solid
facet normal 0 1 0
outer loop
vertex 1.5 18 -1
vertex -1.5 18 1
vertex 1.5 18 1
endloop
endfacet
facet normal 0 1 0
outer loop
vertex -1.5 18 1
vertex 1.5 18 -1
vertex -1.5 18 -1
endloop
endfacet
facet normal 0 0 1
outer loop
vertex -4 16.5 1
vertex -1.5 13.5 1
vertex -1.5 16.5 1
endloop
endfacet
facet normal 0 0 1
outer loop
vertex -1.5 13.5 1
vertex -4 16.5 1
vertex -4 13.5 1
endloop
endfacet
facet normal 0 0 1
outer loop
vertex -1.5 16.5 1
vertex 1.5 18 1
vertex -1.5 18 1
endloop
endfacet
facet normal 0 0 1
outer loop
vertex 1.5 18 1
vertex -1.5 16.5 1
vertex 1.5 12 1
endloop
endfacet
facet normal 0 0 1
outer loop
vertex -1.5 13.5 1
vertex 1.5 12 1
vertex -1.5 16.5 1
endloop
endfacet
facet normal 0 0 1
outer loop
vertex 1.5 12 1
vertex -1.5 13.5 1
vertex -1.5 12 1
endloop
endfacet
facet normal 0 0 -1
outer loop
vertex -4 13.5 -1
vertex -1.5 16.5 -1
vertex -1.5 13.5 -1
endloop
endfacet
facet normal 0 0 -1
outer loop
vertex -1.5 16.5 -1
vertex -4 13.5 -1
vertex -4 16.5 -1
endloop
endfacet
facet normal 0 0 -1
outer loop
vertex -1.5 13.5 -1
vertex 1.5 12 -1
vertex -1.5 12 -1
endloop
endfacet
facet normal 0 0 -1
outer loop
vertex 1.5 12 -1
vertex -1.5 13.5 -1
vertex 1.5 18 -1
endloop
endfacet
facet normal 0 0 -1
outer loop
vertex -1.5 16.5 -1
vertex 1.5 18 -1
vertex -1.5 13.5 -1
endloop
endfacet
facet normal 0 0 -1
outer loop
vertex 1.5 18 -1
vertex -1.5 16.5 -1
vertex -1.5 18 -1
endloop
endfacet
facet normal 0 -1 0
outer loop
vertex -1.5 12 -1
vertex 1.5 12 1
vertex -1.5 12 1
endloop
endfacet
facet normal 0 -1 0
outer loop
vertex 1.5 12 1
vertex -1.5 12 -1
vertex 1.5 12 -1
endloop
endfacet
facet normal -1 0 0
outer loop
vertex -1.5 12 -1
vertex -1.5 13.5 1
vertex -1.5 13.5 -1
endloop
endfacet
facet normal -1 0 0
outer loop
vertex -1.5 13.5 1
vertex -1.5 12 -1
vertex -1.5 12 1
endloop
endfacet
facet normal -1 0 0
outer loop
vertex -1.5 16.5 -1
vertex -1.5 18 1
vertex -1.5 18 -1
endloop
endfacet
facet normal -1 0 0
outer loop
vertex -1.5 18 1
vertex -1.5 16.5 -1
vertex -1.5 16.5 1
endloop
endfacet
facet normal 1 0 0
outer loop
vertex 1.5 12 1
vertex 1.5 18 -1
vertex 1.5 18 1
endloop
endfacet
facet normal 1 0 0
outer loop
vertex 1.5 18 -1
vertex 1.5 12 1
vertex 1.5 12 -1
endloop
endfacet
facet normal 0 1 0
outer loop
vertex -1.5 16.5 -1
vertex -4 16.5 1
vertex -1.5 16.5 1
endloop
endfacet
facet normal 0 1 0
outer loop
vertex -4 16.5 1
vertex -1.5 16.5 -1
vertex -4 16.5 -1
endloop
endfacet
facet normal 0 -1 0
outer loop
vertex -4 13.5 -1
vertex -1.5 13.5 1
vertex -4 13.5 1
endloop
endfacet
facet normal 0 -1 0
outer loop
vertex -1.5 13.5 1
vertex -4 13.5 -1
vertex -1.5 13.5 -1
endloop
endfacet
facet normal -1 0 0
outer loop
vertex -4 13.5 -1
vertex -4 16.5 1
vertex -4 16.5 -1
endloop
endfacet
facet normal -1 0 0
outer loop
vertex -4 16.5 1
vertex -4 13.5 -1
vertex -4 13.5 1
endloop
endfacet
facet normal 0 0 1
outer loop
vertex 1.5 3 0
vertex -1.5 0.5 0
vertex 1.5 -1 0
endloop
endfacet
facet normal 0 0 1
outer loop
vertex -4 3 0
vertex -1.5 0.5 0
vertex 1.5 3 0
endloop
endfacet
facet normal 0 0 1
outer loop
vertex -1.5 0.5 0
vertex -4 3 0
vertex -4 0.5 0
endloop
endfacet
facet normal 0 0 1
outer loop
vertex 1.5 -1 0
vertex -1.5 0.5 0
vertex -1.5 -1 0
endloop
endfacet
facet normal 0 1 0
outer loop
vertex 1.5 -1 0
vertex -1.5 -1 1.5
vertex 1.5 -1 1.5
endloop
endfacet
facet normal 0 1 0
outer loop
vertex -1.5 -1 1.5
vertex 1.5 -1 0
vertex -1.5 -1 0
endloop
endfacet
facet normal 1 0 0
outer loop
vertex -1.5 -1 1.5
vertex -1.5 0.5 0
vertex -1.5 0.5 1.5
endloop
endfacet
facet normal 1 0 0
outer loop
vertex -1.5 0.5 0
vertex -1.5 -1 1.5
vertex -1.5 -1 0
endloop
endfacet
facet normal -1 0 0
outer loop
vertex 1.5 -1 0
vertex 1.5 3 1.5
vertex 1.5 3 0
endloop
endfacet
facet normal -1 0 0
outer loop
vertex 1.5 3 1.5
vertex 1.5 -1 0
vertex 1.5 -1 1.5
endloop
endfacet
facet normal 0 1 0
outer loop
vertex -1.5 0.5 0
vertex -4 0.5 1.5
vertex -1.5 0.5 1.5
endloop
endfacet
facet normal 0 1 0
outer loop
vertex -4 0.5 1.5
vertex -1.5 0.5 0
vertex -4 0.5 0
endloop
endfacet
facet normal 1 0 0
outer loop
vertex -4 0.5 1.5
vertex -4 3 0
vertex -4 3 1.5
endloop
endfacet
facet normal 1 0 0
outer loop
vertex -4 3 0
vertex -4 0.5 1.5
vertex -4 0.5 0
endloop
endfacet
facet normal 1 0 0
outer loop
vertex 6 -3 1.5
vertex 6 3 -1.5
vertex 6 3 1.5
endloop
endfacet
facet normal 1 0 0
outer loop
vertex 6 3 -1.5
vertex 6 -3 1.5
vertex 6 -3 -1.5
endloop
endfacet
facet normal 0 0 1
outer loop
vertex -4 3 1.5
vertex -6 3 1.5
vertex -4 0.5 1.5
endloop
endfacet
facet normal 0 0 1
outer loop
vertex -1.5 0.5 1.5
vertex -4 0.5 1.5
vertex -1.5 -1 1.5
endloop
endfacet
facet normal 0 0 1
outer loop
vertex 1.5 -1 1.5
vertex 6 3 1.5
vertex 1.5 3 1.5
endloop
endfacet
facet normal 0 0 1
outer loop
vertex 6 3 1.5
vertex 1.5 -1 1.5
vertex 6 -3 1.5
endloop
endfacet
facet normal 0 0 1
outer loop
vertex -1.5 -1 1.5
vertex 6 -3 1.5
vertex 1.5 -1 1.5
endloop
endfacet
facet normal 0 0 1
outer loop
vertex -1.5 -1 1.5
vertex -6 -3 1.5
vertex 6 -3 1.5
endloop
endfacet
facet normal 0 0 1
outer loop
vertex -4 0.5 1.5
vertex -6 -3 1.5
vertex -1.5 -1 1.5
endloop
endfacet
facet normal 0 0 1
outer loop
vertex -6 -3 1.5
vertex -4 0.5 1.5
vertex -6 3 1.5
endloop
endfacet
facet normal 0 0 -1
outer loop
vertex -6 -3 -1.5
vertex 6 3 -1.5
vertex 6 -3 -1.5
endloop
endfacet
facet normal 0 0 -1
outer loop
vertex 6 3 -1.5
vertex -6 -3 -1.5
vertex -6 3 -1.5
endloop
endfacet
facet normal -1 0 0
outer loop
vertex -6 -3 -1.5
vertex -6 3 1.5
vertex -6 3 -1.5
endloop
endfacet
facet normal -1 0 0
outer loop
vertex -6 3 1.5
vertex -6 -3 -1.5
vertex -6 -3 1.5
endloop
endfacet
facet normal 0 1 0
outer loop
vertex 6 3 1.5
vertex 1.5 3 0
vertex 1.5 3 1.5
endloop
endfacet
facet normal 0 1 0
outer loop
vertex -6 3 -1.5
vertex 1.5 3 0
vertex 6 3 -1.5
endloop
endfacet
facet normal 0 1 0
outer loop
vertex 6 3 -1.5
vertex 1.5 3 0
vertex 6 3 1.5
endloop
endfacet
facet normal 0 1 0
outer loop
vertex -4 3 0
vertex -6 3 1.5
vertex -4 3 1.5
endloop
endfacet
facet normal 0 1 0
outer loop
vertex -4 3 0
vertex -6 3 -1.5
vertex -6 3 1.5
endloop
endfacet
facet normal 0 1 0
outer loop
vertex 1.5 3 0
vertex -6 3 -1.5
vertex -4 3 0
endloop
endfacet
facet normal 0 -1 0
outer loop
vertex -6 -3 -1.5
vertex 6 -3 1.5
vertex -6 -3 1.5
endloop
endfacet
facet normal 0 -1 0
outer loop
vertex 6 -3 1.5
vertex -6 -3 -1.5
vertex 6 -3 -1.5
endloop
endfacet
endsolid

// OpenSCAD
// enzyme_decomposition.scad
// 分解作用酵素與受質

// 受質（上方綠色十字形）
module substrate_decomposition() {
    color("green")
    rotate([0,0,90])
    union() {
        cube([6, 3, 2], center=true);
        translate([0, 2.5, 0]) 
        cube([3, 3, 2], center=true);
    }
}

// 酵素（下方灰色凹槽）
module enzyme_decomposition() {
    difference() {
        // 主體
        color("gray") 
        cube([12, 6, 3], center=true);
        

        // 用受質形狀產生凹槽
        translate([0, 2, 1]) substrate_decomposition();
          
    }
}

// 渲染
translate([0, 15, 0]) substrate_decomposition();
enzyme_decomposition();
